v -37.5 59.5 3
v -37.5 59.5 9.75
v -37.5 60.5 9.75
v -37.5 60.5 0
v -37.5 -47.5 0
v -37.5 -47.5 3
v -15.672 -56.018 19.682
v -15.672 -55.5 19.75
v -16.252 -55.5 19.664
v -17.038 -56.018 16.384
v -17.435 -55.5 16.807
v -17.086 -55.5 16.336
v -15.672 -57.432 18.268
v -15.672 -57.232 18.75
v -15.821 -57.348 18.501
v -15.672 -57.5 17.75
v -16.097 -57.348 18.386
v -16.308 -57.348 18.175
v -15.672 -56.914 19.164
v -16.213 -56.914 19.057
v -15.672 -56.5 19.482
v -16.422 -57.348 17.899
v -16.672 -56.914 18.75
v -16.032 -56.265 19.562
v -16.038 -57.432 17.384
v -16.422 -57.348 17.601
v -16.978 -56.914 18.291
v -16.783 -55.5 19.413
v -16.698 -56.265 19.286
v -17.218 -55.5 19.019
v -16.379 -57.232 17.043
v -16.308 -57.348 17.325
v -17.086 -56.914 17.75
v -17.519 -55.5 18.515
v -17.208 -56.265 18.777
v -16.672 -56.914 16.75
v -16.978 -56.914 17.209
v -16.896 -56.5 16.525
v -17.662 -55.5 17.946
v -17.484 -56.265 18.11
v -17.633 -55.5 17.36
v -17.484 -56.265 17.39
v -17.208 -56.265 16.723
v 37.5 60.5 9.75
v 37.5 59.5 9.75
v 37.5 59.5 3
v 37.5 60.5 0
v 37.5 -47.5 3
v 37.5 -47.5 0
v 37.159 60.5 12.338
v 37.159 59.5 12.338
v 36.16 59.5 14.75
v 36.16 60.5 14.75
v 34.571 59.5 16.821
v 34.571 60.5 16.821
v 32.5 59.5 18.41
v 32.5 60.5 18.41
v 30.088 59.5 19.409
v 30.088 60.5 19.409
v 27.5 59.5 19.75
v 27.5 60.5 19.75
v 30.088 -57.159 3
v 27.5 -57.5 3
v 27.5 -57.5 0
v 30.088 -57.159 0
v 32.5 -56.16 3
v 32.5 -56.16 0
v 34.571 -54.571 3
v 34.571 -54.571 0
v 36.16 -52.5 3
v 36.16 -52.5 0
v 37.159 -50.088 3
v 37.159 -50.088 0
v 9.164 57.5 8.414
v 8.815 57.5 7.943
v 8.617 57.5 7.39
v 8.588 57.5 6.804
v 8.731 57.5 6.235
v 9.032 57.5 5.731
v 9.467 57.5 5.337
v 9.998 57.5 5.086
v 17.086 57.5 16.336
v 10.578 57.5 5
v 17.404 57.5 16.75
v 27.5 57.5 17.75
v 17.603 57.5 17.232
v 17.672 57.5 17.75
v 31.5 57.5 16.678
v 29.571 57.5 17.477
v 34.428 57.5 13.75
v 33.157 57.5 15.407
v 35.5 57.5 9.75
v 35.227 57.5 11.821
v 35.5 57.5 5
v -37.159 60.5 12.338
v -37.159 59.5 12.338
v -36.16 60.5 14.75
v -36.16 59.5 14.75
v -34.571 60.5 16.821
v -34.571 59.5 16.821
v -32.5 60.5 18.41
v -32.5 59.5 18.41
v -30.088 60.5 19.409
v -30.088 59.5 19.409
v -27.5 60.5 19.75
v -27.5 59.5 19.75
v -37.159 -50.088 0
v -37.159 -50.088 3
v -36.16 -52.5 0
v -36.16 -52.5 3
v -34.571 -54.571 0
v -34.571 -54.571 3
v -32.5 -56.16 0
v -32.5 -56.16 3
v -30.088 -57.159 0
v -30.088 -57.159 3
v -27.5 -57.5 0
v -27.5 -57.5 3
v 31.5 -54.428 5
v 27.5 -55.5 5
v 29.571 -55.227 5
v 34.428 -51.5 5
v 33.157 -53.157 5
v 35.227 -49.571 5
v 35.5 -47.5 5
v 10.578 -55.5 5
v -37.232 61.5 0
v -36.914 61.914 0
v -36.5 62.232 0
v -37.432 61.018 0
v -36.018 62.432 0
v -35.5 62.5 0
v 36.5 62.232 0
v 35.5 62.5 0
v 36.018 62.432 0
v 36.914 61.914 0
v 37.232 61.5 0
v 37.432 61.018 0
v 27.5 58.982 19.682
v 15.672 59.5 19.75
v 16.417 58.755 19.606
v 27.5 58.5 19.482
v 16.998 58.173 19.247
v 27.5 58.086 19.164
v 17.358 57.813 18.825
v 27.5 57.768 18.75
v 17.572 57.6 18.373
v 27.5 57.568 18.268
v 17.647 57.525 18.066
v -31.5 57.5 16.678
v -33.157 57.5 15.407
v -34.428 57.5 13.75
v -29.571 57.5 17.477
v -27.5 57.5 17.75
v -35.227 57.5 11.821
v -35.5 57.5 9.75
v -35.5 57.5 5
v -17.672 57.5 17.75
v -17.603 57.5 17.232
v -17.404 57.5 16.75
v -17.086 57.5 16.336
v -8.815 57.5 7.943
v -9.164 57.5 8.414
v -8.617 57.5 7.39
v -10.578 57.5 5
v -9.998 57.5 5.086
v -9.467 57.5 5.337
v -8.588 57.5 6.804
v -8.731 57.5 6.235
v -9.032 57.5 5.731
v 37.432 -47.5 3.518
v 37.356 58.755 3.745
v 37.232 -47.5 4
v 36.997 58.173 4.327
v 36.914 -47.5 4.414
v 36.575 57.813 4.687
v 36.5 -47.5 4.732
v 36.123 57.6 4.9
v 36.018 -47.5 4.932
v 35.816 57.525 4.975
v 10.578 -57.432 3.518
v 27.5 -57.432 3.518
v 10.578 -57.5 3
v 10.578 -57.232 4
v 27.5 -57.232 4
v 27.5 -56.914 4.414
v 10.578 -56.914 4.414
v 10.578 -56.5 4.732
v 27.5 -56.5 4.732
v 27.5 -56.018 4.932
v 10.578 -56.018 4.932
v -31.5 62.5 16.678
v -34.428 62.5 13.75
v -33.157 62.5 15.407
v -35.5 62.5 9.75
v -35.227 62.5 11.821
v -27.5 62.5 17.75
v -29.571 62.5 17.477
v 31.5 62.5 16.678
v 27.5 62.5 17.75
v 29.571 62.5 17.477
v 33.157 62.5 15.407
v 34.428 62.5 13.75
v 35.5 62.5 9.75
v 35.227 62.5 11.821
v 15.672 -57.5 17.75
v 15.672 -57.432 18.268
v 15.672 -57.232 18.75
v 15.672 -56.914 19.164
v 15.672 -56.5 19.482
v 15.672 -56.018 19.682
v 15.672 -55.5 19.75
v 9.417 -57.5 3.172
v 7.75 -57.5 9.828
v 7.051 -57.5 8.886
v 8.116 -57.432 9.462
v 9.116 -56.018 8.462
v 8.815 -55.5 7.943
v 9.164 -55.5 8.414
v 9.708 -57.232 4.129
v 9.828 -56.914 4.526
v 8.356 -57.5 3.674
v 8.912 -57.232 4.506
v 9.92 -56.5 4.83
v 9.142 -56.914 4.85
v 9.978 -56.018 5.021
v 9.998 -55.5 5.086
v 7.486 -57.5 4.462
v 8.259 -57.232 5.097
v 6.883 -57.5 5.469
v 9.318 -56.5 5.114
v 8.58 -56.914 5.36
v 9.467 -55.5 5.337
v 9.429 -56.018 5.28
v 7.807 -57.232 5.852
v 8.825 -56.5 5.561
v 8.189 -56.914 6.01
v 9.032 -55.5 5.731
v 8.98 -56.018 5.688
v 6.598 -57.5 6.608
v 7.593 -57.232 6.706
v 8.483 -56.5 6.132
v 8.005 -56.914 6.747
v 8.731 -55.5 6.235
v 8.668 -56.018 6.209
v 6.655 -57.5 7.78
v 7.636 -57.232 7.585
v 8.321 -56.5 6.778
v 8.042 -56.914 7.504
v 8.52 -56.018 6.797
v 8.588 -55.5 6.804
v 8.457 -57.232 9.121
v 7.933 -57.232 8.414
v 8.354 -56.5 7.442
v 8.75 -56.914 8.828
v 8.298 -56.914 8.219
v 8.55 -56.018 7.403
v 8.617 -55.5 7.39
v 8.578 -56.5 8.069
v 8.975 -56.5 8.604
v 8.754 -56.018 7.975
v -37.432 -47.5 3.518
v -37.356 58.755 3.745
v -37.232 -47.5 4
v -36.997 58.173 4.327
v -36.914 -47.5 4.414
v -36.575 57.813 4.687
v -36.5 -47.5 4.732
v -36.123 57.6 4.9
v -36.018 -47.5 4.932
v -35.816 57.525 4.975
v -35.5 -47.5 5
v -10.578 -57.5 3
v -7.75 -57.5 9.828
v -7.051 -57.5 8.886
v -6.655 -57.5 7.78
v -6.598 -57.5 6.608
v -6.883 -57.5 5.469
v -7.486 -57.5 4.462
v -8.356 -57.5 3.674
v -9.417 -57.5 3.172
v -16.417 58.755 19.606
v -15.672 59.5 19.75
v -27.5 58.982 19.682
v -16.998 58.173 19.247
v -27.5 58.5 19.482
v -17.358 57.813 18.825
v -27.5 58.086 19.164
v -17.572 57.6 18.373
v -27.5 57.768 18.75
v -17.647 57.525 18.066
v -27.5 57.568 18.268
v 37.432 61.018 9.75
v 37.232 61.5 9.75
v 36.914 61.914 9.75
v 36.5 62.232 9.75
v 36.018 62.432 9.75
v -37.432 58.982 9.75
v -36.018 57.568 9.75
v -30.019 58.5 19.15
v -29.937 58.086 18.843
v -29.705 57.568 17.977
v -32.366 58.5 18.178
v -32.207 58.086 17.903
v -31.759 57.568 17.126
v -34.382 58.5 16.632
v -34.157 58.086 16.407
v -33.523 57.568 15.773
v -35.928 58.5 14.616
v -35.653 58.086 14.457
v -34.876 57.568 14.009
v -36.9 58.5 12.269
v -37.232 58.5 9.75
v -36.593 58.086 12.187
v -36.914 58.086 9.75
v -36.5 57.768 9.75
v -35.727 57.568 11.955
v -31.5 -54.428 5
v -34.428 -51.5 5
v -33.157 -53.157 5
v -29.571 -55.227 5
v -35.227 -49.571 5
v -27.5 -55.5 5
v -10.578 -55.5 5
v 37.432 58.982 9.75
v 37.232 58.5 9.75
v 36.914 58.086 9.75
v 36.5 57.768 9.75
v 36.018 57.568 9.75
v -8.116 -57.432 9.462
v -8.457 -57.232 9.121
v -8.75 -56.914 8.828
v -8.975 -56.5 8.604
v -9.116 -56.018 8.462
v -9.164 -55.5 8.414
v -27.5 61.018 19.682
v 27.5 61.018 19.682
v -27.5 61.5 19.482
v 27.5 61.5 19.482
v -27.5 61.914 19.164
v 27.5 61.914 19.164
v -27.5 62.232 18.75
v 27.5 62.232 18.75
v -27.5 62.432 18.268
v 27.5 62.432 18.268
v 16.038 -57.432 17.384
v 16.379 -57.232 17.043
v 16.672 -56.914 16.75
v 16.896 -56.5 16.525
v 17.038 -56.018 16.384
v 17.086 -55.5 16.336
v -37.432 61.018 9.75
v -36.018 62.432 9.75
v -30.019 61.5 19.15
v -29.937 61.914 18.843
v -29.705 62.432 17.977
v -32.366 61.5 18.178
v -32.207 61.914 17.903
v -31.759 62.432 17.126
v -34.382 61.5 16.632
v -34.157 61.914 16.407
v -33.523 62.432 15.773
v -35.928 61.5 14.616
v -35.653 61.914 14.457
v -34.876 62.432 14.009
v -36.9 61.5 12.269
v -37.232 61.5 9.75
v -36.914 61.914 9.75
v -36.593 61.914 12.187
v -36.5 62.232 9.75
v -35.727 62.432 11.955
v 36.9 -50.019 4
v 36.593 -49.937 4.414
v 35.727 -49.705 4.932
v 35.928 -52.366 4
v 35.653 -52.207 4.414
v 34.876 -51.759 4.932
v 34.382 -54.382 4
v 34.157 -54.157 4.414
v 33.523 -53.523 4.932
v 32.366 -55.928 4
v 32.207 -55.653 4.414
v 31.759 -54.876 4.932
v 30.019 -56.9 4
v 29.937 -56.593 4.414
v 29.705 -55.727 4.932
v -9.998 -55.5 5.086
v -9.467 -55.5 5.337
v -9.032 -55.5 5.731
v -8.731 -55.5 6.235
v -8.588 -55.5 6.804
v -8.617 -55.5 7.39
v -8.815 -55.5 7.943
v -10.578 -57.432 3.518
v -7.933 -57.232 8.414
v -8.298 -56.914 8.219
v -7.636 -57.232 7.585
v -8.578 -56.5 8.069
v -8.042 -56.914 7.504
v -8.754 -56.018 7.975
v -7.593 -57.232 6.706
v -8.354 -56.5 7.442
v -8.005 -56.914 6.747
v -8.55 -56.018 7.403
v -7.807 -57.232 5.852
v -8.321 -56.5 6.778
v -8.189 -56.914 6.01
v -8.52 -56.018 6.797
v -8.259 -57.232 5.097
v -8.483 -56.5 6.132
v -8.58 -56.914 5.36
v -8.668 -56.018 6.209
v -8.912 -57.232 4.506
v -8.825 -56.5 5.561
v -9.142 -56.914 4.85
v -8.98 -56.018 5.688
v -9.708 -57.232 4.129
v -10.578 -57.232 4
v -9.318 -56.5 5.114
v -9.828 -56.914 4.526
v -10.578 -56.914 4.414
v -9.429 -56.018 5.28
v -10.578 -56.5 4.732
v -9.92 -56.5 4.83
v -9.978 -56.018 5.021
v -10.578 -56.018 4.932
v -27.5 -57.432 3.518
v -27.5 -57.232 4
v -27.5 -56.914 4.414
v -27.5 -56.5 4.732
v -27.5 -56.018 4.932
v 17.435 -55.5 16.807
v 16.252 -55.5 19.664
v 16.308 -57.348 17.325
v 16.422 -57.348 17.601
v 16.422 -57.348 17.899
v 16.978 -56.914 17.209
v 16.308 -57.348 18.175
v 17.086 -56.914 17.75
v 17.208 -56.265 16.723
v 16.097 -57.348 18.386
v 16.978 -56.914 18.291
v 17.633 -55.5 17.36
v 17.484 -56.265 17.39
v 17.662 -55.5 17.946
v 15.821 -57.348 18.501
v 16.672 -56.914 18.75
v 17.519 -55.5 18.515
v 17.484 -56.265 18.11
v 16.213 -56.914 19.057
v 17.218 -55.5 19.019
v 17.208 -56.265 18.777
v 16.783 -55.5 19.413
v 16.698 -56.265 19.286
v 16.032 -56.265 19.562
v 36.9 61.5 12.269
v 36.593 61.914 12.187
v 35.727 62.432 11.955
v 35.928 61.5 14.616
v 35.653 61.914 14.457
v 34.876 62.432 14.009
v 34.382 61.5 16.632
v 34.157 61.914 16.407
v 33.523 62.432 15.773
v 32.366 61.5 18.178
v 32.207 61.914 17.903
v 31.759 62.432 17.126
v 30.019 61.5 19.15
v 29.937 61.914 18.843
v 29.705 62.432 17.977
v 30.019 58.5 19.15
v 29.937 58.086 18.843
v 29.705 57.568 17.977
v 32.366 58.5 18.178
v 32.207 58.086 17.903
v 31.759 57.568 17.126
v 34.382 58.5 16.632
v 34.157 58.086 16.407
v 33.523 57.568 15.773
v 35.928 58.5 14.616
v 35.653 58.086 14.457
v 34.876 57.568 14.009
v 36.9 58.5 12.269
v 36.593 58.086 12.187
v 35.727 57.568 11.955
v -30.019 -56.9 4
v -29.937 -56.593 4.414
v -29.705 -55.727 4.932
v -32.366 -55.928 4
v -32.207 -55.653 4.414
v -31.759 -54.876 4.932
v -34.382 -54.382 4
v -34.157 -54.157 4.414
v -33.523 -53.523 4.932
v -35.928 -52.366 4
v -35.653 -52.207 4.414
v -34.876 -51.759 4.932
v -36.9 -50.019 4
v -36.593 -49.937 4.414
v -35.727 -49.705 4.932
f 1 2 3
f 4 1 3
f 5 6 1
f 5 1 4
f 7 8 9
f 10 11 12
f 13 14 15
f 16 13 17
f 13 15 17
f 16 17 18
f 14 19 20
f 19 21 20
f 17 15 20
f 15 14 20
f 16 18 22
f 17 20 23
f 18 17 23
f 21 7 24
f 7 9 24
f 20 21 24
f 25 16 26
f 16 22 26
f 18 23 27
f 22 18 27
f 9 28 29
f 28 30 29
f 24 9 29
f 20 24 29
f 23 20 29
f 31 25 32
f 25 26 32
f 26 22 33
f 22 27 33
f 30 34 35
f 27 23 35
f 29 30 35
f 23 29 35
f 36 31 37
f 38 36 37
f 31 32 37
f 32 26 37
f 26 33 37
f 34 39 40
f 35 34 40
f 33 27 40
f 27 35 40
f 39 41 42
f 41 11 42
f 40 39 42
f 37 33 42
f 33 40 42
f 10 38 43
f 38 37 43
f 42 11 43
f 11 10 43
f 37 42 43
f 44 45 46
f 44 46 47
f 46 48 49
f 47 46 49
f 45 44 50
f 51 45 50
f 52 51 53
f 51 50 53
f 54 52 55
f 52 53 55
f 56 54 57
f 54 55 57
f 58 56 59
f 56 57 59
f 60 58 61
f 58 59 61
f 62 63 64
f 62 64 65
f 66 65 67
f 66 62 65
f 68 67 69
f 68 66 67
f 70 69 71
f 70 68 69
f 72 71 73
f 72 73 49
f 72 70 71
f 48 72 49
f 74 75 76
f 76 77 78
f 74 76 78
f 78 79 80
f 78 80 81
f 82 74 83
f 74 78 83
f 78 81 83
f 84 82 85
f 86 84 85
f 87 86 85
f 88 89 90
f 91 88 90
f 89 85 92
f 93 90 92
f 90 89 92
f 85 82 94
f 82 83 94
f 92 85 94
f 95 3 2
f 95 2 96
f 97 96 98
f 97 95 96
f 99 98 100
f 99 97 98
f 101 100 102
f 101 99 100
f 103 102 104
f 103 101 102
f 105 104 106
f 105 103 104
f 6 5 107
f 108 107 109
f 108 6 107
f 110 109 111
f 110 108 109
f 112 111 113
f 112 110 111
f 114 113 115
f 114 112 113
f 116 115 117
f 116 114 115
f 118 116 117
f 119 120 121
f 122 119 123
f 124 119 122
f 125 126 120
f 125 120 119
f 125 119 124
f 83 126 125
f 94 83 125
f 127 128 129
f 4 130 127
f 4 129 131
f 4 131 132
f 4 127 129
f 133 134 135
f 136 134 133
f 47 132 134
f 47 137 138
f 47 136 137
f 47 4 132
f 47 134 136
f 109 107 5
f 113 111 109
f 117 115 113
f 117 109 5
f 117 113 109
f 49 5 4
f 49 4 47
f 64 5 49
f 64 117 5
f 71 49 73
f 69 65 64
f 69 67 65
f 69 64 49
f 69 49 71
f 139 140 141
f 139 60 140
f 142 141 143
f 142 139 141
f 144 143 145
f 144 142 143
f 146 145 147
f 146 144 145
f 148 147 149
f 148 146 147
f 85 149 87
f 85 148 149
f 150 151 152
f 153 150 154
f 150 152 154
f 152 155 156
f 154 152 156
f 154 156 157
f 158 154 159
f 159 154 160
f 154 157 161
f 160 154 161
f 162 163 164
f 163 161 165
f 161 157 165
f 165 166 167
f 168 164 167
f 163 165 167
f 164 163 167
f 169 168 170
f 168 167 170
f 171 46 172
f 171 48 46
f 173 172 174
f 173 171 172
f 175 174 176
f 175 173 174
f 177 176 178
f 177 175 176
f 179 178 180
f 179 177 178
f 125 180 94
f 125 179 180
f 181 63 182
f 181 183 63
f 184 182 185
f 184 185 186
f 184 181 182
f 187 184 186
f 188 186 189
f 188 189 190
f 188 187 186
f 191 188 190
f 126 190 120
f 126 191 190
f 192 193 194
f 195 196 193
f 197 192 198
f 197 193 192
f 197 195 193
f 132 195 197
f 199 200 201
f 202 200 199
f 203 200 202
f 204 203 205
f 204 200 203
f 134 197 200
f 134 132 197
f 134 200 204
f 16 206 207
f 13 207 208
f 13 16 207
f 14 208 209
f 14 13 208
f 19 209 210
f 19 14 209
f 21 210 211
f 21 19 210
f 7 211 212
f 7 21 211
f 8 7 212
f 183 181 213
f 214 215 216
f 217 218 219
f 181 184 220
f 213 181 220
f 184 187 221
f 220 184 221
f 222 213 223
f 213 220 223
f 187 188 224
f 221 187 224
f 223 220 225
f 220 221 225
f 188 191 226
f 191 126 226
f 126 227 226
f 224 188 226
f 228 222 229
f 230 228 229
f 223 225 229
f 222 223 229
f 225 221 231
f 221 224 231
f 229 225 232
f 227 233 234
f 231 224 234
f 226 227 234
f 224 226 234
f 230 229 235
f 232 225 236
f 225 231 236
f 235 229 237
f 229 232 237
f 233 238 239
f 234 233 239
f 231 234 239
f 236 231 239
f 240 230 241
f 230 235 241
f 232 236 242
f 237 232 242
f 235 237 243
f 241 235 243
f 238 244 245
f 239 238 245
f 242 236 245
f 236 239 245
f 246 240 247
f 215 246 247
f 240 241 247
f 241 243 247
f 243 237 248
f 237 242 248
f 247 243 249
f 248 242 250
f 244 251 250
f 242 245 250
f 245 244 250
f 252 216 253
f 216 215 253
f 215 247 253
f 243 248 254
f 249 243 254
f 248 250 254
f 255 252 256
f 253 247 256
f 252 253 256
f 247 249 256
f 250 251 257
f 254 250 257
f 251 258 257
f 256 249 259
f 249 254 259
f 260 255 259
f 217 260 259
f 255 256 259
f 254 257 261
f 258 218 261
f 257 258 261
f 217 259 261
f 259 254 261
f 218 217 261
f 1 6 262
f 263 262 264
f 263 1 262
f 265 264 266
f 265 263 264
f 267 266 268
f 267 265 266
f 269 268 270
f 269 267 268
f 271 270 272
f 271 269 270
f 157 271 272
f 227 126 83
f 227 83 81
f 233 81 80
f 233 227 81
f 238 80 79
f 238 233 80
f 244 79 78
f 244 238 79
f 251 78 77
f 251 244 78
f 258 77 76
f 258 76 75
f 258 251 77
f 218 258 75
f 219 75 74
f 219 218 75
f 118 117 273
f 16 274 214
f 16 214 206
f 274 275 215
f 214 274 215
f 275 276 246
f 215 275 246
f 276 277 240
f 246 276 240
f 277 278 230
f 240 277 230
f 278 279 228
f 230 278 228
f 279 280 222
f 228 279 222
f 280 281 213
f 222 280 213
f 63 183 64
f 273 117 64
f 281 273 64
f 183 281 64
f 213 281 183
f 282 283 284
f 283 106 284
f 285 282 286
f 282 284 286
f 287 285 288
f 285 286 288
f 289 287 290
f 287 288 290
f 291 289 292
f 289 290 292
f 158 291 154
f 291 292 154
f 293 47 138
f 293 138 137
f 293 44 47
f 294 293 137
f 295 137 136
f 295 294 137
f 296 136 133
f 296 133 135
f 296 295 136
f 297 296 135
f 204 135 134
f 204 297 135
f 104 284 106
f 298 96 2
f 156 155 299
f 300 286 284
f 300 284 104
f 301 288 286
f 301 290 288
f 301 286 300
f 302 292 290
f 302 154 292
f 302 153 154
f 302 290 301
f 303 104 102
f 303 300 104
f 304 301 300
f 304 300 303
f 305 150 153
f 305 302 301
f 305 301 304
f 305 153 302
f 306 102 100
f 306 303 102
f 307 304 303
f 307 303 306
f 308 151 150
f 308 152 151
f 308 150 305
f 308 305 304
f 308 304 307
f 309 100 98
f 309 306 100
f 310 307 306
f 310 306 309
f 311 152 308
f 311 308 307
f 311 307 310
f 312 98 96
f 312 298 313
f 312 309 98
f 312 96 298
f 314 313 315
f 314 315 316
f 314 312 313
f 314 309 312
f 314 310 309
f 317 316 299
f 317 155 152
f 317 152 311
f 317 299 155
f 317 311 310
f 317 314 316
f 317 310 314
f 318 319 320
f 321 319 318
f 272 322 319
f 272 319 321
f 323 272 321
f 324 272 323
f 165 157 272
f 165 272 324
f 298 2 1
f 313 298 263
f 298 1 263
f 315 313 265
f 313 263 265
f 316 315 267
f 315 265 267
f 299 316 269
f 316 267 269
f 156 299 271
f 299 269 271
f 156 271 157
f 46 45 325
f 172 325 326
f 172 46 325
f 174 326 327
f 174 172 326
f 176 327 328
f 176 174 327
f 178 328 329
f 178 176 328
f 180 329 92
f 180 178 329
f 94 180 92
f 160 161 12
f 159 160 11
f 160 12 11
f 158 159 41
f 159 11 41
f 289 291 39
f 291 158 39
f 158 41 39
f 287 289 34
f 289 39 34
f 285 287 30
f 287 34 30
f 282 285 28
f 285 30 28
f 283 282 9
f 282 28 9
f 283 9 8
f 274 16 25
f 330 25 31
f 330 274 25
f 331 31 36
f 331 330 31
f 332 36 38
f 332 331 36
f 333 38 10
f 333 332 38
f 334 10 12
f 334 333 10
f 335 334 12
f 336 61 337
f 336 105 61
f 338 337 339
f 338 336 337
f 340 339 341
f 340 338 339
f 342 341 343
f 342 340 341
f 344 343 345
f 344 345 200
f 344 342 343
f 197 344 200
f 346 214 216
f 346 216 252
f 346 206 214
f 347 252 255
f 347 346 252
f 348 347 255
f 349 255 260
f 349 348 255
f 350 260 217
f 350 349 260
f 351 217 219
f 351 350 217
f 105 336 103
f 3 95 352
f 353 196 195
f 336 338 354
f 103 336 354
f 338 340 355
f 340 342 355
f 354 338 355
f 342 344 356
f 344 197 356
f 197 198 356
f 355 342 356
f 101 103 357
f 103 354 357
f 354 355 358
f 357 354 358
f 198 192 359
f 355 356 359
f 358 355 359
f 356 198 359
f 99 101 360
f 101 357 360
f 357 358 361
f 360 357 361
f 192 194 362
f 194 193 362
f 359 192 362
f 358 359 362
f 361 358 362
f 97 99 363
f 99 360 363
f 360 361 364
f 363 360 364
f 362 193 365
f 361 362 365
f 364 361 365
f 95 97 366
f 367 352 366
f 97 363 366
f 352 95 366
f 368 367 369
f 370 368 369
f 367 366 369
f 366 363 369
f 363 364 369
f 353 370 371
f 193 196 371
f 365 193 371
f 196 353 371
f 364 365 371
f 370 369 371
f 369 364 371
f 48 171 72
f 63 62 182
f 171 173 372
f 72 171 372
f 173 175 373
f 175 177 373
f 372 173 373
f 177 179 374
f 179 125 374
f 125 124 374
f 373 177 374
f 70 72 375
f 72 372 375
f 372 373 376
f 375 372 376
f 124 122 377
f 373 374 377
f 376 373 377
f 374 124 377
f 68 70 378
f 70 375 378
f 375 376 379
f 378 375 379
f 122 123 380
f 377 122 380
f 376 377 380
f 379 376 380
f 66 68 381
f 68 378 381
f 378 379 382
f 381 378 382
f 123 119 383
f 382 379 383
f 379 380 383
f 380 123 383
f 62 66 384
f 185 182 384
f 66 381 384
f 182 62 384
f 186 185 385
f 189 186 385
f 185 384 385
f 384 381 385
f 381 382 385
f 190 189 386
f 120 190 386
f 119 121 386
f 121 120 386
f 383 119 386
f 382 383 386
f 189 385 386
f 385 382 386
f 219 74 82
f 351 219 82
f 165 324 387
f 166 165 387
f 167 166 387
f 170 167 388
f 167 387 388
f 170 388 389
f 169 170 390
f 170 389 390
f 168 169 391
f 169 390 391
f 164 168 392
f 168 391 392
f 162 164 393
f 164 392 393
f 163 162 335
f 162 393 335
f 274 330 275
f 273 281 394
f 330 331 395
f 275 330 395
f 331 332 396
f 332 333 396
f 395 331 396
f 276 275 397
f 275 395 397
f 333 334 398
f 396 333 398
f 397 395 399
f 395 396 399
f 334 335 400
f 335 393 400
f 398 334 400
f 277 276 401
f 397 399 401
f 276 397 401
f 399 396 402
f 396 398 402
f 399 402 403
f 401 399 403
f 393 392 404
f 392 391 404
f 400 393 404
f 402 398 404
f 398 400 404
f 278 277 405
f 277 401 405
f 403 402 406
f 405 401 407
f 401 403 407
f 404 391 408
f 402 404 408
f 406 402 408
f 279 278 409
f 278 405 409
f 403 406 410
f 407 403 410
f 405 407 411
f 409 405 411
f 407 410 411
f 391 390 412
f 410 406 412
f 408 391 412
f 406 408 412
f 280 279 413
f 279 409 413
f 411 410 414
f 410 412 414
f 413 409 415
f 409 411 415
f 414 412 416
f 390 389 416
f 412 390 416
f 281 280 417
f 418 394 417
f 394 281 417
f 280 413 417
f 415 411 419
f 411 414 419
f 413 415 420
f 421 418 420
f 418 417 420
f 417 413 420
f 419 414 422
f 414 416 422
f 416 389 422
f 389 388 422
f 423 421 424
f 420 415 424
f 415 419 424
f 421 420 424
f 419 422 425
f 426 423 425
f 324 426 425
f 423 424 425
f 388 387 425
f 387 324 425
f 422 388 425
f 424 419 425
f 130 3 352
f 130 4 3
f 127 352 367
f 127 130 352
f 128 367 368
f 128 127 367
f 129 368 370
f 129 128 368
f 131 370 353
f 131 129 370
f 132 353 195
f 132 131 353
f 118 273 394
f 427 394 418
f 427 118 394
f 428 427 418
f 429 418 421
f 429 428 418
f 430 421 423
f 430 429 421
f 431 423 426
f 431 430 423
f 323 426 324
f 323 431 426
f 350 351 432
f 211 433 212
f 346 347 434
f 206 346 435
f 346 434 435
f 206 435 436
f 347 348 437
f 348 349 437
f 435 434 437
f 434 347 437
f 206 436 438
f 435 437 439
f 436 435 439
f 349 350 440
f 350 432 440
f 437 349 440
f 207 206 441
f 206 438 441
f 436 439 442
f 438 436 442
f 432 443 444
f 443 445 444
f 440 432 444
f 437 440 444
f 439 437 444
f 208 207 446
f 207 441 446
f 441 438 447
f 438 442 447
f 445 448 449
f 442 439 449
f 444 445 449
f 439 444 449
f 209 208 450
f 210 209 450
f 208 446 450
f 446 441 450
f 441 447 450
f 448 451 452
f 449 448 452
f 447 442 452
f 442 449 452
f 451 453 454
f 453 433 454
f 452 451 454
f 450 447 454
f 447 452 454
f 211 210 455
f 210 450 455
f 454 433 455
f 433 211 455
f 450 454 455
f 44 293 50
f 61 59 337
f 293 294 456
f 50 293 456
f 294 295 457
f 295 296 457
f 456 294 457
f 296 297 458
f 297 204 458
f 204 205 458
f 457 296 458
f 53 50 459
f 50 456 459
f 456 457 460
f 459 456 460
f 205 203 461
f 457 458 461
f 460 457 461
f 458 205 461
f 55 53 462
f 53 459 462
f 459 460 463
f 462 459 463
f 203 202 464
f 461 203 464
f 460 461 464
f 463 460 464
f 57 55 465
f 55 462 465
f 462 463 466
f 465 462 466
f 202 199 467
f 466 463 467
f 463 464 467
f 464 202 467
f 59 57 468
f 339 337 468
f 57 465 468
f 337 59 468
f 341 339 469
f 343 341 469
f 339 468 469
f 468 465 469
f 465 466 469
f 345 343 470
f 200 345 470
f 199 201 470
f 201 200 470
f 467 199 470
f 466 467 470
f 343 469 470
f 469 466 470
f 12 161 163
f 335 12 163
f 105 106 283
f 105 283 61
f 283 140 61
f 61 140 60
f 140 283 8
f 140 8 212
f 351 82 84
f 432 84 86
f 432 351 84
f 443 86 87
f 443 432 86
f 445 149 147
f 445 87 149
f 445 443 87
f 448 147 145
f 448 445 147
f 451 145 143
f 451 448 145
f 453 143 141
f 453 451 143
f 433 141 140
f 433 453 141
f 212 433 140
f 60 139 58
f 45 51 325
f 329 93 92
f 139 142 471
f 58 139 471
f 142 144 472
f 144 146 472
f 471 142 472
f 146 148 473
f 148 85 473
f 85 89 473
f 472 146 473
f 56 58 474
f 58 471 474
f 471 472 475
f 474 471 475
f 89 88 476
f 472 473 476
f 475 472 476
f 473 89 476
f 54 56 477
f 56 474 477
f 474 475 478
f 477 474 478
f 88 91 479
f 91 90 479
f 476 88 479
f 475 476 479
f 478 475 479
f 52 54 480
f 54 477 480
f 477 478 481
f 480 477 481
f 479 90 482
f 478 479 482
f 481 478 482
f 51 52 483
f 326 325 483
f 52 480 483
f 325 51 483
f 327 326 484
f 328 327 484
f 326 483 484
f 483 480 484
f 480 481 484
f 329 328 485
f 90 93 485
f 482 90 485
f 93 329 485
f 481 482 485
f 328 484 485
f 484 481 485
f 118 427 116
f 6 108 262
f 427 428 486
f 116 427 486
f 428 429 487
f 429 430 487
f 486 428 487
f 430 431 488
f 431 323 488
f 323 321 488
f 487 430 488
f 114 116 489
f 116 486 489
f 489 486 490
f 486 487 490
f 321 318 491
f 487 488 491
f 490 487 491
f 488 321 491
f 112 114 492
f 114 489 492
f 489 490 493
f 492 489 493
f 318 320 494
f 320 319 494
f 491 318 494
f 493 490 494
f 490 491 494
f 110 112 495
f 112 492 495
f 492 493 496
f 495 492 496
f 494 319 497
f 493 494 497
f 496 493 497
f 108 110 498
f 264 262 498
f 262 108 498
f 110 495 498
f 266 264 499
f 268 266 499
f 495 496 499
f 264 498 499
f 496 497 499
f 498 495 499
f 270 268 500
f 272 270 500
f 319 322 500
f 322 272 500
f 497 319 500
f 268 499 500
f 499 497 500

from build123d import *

# Parameters (mm, degrees)
SKETCH1_W           = 75
SKETCH1_H           = 115
BOSS_EXTRUDE1_DEPTH = 5
BOSS_EXTRUDE2_DEPTH = 115
FILLET1_R           = 2
SKETCH5_W           = 75
SKETCH5_H           = 19.75
BOSS_EXTRUDE3_DEPTH = 5
FILLET2_R           = 10
FILLET3_R           = 2


with BuildPart() as part:
    # Sketch1 → Boss-Extrude1 (new body)
    with BuildSketch(Plane.XY):
        Rectangle(SKETCH1_W, SKETCH1_H)
    extrude(amount=BOSS_EXTRUDE1_DEPTH)

    # Sketch4 → Boss-Extrude2 (add)
    with BuildSketch(Plane(origin=(0, 57.5, 0), x_dir=(1, 0, 0), z_dir=(0, 1, 0))):
        Polygon((-5.75, -5), (5.75, -5), (20.5, -19.75), (-20.5, -19.75), align=None)
    extrude(amount=-BOSS_EXTRUDE2_DEPTH)

    # Fillet1
    fillet1_edges = [part.edges().sort_by_distance(p)[0] for p in [
        (5.75, 0, 5),
        (20.5, 0, 19.75),
        (-20.5, 0, 19.75),
        (-5.75, 0, 5),
    ]]
    fillet(fillet1_edges, radius=FILLET1_R)

    # Sketch5 → Boss-Extrude3 (add)
    with BuildSketch(Plane(origin=(0, 57.5, 0), x_dir=(1, 0, 0), z_dir=(0, 1, 0))):
        with Locations((0, -9.875)):
            Rectangle(SKETCH5_W, SKETCH5_H)
    extrude(amount=BOSS_EXTRUDE3_DEPTH)

    # Fillet2
    fillet2_edges = [part.edges().sort_by_distance(p)[0] for p in [
        (-37.5, 60, 19.75),
        (37.5, 60, 19.75),
        (37.5, -57.5, 2.5),
        (-37.5, -57.5, 2.5),
    ]]
    fillet(fillet2_edges, radius=FILLET2_R)

    # Fillet3
    fillet3_edges = [part.edges().sort_by_distance(p)[0] for p in [
        (-37.5, 5, 5),
        (-13.125, -57.5, 12.375),
        (13.125, -57.5, 12.375),
        (19.039213562, -57.5, 5),
        (0, -57.5, 19.75),
        (-17.51933194, -57.5, 18.515366865),
        (17.51933194, -57.5, 18.515366865),
        (-8.73066806, -57.5, 6.234633135),
        (8.73066806, -57.5, 6.234633135),
        (-37.5, 57.5, 7.375),
        (21.585786438, 57.5, 19.75),
        (-37.5, 62.5, 4.875),
        (0, 62.5, 19.75),
        (-21.585786438, 57.5, 19.75),
        (-34.571067812, 57.5, 16.821067812),
        (37.5, 62.5, 4.875),
        (34.571067812, 62.5, 16.821067812),
        (-34.571067812, 62.5, 16.821067812),
        (37.5, 57.5, 7.375),
        (37.5, 5, 5),
        (34.571067812, 57.5, 16.821067812),
        (-19.039213562, -57.5, 5),
        (34.571067812, -54.571067812, 5),
        (-34.571067812, -54.571067812, 5),
    ]]
    fillet(fillet3_edges, radius=FILLET3_R)


solid = part.part
